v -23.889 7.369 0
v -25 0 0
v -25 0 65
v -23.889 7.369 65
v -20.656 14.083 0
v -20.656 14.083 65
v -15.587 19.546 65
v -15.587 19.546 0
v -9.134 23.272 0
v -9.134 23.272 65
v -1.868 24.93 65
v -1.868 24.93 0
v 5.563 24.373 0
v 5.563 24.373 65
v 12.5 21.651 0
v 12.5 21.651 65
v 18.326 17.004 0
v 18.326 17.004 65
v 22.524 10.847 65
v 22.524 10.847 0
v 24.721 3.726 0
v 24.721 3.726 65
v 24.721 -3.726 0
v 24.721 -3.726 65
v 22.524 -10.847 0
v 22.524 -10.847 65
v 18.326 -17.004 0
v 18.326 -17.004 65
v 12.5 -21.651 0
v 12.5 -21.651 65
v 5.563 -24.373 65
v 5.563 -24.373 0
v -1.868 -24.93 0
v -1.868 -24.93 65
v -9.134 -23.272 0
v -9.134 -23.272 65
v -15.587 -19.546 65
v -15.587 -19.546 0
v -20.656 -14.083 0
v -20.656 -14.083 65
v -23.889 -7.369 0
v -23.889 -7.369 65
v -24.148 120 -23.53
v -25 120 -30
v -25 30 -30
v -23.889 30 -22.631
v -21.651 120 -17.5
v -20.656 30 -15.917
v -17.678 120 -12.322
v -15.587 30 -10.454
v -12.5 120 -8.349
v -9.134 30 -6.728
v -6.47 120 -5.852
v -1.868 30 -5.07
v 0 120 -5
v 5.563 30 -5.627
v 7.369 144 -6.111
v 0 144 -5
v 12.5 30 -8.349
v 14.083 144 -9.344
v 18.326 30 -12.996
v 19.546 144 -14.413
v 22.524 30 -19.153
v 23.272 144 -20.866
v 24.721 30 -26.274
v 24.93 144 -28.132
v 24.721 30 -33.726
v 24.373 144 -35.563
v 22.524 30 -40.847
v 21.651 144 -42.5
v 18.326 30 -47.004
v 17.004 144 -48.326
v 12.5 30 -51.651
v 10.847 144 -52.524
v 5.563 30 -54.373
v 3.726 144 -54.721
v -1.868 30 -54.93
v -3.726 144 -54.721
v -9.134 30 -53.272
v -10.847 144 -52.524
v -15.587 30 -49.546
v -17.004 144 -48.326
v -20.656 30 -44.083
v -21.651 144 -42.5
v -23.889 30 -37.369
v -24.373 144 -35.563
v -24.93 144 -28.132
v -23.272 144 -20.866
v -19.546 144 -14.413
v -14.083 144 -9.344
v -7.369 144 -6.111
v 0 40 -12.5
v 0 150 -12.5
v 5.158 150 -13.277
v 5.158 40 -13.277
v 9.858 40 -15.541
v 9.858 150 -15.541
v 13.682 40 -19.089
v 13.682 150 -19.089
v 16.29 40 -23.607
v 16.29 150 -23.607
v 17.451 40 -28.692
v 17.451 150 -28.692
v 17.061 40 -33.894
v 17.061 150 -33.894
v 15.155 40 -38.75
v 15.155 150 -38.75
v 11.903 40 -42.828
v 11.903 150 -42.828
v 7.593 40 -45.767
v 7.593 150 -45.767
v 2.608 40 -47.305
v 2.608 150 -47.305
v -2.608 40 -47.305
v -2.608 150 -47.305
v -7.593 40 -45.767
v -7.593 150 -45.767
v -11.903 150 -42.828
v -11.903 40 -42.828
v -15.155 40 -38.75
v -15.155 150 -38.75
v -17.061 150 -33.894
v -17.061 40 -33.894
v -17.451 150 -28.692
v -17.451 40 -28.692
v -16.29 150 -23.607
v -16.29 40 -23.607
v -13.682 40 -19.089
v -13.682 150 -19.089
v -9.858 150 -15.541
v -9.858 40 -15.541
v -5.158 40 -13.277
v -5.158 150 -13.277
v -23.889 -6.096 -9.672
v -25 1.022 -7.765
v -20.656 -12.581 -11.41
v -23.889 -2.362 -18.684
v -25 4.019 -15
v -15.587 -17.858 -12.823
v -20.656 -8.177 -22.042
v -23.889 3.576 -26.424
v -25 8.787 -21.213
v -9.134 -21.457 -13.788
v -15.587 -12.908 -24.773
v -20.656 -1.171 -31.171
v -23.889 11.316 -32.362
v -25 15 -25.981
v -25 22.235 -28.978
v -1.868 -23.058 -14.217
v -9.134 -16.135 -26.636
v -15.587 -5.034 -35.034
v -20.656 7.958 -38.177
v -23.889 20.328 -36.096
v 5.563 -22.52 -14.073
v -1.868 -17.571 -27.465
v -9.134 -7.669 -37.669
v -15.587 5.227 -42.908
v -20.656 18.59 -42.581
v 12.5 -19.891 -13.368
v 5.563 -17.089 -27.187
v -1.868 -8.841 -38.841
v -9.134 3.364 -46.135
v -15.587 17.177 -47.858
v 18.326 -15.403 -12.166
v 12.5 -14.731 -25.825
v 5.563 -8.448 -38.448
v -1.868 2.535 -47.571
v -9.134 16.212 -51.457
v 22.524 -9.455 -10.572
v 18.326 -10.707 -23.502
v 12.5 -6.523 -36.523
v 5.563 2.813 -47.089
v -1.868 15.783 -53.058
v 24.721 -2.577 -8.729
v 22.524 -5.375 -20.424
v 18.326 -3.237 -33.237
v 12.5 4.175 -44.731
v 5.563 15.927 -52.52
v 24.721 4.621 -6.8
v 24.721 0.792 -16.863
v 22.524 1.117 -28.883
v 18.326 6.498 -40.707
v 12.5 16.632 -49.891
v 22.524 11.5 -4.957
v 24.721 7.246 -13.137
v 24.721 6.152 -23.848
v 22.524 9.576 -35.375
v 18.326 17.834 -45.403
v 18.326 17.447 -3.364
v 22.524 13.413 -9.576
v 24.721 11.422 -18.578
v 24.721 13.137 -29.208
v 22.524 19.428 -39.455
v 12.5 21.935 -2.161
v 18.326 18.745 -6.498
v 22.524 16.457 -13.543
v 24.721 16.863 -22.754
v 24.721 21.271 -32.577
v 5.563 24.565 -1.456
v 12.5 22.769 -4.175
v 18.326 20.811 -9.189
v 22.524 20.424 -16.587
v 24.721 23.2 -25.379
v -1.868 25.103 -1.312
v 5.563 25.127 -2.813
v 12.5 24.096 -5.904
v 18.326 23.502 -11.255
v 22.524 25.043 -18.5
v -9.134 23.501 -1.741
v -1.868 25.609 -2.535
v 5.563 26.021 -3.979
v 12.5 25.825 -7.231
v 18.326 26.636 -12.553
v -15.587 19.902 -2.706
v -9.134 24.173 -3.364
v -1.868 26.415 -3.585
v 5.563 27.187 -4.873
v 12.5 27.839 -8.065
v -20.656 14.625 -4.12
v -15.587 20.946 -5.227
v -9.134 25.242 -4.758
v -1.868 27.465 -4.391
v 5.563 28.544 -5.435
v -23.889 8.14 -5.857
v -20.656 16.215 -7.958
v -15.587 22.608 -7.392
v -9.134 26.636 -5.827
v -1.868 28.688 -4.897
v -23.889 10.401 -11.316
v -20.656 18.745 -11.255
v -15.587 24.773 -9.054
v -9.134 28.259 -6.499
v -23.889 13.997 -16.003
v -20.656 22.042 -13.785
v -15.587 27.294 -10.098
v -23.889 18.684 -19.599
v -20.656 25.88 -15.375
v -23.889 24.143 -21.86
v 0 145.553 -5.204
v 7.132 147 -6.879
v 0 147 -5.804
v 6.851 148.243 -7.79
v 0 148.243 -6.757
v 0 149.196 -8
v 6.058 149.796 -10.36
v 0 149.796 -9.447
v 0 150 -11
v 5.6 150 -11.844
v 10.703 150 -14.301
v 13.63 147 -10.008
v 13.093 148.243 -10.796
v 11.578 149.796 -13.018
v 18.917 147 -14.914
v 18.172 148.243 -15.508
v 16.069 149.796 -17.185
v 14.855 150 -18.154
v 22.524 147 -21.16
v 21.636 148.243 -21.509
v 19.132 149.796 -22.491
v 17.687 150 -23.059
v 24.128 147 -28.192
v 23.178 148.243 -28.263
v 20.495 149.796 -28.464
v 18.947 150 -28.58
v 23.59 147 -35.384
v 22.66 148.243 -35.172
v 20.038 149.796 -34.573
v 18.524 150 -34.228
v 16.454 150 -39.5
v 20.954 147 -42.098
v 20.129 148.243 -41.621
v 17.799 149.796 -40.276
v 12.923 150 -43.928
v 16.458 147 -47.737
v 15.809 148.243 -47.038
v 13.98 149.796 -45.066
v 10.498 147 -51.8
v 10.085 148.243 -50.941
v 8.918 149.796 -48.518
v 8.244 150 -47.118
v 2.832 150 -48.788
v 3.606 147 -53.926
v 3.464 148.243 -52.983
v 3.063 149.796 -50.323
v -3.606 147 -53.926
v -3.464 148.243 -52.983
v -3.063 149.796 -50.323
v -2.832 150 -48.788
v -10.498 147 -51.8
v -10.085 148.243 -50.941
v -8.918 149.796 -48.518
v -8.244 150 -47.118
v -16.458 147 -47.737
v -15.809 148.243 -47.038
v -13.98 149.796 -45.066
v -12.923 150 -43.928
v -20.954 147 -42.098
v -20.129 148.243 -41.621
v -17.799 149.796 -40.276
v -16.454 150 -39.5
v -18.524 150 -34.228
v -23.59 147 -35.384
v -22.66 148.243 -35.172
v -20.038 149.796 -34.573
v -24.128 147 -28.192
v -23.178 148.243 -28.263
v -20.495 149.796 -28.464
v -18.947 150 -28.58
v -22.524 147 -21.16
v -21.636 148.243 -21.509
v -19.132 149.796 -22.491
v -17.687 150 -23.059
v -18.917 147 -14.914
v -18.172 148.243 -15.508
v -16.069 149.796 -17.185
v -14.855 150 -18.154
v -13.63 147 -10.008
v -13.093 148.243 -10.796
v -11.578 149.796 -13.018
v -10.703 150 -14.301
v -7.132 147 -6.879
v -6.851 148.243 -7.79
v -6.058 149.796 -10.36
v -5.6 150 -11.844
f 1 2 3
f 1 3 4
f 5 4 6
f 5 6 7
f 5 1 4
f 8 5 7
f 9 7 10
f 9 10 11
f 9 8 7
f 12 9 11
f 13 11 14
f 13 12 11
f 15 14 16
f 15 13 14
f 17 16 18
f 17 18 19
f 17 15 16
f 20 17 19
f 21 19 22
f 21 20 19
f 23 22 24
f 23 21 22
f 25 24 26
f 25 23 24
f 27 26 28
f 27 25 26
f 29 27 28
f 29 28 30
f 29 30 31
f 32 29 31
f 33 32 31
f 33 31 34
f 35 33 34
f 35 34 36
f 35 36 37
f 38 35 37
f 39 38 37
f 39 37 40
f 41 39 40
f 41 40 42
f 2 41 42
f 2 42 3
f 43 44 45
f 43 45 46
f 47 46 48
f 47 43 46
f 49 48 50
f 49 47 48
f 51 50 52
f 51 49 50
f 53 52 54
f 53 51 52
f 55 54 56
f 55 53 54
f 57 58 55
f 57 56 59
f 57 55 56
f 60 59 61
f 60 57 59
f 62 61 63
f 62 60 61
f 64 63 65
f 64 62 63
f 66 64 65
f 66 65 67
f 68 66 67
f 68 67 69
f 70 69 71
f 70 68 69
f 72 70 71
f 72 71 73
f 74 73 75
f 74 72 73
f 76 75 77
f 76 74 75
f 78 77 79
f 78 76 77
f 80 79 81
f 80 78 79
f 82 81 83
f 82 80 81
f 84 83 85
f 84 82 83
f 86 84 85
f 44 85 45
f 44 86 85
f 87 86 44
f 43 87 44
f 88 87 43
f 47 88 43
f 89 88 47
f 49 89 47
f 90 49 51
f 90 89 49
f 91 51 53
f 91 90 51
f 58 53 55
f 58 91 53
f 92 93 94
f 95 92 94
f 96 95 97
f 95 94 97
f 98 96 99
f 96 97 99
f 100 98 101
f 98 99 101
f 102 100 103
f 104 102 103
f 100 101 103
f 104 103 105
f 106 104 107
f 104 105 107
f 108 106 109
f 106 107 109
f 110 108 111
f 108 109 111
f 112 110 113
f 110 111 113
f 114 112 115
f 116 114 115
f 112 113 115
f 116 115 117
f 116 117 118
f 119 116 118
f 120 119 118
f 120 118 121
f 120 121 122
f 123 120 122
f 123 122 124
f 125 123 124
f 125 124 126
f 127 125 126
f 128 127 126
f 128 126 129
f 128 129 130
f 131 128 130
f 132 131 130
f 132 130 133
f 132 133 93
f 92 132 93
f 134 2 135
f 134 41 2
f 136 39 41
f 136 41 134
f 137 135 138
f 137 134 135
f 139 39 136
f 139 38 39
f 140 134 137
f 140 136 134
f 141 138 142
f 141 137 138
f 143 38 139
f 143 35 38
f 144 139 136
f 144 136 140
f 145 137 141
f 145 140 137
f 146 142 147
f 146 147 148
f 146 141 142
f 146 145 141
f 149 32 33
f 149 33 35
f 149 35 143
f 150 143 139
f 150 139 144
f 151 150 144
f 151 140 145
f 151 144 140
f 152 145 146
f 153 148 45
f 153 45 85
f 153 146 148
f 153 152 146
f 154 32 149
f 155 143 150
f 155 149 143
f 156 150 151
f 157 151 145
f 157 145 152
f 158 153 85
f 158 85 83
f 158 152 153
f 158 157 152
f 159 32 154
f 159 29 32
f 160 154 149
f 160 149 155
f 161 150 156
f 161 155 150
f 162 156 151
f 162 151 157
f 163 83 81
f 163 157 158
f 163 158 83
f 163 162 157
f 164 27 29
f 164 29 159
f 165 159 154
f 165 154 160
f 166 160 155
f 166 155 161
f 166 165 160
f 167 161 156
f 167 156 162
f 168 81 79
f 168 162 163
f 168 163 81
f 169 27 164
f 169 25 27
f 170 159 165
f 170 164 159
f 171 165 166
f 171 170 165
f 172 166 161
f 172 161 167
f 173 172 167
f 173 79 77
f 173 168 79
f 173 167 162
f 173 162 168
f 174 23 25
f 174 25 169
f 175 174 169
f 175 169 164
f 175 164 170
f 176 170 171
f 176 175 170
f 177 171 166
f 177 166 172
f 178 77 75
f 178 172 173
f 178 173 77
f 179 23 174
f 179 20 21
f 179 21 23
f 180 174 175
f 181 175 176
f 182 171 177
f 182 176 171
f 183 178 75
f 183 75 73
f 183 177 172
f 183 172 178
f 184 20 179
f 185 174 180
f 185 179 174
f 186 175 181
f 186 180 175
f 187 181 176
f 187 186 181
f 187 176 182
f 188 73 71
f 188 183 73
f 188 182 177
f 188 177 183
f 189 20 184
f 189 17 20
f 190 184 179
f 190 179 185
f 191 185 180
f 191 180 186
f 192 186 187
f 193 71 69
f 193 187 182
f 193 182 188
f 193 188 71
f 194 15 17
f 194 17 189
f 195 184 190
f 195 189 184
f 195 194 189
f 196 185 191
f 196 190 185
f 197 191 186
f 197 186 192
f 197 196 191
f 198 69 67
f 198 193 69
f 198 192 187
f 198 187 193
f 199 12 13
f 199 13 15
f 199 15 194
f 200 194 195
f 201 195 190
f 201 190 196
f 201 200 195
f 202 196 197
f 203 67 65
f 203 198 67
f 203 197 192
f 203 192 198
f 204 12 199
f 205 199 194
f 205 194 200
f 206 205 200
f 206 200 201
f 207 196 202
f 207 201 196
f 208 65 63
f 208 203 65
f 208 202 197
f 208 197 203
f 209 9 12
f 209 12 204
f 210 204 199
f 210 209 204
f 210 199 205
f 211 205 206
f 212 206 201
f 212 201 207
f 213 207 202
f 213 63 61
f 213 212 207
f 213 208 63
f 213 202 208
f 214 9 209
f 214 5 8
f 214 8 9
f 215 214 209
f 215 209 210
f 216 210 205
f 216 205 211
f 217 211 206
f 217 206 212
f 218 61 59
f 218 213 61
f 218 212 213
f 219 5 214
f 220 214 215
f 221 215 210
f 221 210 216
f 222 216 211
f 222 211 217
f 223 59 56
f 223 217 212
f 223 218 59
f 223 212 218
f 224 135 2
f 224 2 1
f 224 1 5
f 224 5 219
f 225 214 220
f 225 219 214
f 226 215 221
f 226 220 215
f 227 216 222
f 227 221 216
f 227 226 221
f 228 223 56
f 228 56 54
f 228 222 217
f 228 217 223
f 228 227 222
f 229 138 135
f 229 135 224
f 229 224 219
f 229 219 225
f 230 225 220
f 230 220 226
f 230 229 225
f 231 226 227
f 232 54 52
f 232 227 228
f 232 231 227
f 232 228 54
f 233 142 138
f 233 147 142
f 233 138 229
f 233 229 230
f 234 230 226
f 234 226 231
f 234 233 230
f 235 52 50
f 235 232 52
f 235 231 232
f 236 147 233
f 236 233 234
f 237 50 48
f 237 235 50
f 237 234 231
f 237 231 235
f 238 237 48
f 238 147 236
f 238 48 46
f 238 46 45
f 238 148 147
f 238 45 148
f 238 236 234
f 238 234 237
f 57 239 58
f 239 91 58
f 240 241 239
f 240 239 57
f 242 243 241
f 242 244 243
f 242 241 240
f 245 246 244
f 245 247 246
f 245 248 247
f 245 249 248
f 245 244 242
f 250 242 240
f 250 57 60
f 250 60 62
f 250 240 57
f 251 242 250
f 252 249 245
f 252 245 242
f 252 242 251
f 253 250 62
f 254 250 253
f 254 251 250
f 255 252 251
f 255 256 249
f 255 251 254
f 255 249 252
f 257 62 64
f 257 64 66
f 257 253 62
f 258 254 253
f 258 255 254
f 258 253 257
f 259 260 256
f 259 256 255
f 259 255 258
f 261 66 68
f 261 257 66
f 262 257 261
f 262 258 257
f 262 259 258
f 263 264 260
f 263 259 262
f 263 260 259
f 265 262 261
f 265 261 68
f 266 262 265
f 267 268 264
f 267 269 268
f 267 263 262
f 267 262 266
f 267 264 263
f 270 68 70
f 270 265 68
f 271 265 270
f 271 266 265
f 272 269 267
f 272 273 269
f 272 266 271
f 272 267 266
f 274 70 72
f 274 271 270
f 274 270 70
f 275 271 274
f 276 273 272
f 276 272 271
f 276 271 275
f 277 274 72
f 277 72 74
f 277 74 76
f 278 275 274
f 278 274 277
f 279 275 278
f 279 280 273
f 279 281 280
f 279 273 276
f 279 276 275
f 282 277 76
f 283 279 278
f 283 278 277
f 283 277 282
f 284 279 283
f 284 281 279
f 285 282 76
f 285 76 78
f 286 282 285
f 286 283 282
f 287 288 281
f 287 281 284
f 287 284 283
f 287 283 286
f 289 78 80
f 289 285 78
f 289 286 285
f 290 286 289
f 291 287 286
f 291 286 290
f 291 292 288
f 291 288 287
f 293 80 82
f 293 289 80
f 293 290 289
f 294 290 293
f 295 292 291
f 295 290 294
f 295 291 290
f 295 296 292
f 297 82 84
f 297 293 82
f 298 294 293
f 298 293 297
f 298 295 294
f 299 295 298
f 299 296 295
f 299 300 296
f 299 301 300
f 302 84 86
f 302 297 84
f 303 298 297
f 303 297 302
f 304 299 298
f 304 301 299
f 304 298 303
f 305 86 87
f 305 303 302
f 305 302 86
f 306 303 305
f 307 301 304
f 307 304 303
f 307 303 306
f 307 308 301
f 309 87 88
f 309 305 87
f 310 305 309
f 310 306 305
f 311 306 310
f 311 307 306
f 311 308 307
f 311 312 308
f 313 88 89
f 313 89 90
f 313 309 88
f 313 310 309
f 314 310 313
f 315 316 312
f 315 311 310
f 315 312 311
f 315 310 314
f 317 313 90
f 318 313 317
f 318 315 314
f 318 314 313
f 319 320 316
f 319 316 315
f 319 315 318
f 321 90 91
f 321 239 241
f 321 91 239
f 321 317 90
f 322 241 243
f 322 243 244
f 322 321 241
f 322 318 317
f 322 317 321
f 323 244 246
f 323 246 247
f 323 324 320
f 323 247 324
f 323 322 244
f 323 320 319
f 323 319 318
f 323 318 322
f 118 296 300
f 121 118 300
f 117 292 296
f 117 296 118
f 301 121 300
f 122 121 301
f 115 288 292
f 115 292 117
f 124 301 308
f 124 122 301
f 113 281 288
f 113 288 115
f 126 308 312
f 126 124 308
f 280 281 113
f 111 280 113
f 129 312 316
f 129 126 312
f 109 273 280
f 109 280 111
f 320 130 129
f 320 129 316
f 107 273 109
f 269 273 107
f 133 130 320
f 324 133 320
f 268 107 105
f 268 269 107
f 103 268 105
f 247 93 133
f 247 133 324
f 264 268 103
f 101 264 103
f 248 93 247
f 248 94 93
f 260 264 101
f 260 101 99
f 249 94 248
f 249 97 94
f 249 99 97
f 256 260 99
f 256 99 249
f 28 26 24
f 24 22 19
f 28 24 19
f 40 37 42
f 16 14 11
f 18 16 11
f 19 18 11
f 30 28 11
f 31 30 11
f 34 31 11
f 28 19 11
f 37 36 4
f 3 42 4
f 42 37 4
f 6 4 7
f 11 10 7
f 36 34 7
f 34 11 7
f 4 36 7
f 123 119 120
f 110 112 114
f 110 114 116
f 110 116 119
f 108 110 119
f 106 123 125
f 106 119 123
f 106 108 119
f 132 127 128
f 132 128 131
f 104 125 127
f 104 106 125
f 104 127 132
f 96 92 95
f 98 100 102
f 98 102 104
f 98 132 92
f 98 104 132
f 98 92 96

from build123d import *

# Parameters (mm, degrees)
SWEEP1_PROFILE_R    = 25
BOSS_EXTRUDE2_START = 30
SKETCH32_R          = 25
SKETCH32_R_2        = 17.5
BOSS_EXTRUDE2_DEPTH = 30
FILLET1_R           = 6
SKETCH33_R          = 17.5
CUT_EXTRUDE1_DEPTH  = 80


with BuildPart() as part:
    # Sweep1: sweep along a path in Sketch2
    with BuildLine(Plane(origin=(0, 0, 0), x_dir=(0, 0, -1), z_dir=(1, 0, 0))) as sweep1_path:
        Line((-65, 0), (0, 0))
        ThreePointArc((0, 0), (21.213203436, 8.786796564), (30, 30))
        Line((30, 30), (30, 120))
    # Sweep1 profile (on start of the path) → Sweep1 (sweep)
    with BuildSketch(Plane(origin=(0, 0, 65), x_dir=(-1, 0, 0), z_dir=(0, 0, -1))):
        Circle(SWEEP1_PROFILE_R)
    sweep(path=sweep1_path.line)

    # Sketch32 → Boss-Extrude2 (add)
    with BuildSketch(Plane(origin=(0, 120, 0), x_dir=(1, 0, 0), z_dir=(0, 1, 0)).offset(BOSS_EXTRUDE2_START)):
        with Locations(Location((0, 30, 0), (0, 0, 270))):
            Circle(SKETCH32_R)
        with Locations(Location((0, 30, 0), (0, 0, 270))):
            Circle(SKETCH32_R_2, mode=Mode.SUBTRACT)
    extrude(amount=-BOSS_EXTRUDE2_DEPTH)

    # Fillet1
    fillet1_edges = [part.edges().sort_by_distance(p)[0] for p in [
        (0, 150, -55),
    ]]
    fillet(fillet1_edges, radius=FILLET1_R)

    # Sketch33 → Cut-Extrude1 (cut)
    with BuildSketch(Plane(origin=(0, 120, 0), x_dir=(1, 0, 0), z_dir=(0, 1, 0))):
        with Locations(Location((0, 30, 0), (0, 0, 270))):
            Circle(SKETCH33_R)
    extrude(amount=-CUT_EXTRUDE1_DEPTH, mode=Mode.SUBTRACT)


solid = part.part
